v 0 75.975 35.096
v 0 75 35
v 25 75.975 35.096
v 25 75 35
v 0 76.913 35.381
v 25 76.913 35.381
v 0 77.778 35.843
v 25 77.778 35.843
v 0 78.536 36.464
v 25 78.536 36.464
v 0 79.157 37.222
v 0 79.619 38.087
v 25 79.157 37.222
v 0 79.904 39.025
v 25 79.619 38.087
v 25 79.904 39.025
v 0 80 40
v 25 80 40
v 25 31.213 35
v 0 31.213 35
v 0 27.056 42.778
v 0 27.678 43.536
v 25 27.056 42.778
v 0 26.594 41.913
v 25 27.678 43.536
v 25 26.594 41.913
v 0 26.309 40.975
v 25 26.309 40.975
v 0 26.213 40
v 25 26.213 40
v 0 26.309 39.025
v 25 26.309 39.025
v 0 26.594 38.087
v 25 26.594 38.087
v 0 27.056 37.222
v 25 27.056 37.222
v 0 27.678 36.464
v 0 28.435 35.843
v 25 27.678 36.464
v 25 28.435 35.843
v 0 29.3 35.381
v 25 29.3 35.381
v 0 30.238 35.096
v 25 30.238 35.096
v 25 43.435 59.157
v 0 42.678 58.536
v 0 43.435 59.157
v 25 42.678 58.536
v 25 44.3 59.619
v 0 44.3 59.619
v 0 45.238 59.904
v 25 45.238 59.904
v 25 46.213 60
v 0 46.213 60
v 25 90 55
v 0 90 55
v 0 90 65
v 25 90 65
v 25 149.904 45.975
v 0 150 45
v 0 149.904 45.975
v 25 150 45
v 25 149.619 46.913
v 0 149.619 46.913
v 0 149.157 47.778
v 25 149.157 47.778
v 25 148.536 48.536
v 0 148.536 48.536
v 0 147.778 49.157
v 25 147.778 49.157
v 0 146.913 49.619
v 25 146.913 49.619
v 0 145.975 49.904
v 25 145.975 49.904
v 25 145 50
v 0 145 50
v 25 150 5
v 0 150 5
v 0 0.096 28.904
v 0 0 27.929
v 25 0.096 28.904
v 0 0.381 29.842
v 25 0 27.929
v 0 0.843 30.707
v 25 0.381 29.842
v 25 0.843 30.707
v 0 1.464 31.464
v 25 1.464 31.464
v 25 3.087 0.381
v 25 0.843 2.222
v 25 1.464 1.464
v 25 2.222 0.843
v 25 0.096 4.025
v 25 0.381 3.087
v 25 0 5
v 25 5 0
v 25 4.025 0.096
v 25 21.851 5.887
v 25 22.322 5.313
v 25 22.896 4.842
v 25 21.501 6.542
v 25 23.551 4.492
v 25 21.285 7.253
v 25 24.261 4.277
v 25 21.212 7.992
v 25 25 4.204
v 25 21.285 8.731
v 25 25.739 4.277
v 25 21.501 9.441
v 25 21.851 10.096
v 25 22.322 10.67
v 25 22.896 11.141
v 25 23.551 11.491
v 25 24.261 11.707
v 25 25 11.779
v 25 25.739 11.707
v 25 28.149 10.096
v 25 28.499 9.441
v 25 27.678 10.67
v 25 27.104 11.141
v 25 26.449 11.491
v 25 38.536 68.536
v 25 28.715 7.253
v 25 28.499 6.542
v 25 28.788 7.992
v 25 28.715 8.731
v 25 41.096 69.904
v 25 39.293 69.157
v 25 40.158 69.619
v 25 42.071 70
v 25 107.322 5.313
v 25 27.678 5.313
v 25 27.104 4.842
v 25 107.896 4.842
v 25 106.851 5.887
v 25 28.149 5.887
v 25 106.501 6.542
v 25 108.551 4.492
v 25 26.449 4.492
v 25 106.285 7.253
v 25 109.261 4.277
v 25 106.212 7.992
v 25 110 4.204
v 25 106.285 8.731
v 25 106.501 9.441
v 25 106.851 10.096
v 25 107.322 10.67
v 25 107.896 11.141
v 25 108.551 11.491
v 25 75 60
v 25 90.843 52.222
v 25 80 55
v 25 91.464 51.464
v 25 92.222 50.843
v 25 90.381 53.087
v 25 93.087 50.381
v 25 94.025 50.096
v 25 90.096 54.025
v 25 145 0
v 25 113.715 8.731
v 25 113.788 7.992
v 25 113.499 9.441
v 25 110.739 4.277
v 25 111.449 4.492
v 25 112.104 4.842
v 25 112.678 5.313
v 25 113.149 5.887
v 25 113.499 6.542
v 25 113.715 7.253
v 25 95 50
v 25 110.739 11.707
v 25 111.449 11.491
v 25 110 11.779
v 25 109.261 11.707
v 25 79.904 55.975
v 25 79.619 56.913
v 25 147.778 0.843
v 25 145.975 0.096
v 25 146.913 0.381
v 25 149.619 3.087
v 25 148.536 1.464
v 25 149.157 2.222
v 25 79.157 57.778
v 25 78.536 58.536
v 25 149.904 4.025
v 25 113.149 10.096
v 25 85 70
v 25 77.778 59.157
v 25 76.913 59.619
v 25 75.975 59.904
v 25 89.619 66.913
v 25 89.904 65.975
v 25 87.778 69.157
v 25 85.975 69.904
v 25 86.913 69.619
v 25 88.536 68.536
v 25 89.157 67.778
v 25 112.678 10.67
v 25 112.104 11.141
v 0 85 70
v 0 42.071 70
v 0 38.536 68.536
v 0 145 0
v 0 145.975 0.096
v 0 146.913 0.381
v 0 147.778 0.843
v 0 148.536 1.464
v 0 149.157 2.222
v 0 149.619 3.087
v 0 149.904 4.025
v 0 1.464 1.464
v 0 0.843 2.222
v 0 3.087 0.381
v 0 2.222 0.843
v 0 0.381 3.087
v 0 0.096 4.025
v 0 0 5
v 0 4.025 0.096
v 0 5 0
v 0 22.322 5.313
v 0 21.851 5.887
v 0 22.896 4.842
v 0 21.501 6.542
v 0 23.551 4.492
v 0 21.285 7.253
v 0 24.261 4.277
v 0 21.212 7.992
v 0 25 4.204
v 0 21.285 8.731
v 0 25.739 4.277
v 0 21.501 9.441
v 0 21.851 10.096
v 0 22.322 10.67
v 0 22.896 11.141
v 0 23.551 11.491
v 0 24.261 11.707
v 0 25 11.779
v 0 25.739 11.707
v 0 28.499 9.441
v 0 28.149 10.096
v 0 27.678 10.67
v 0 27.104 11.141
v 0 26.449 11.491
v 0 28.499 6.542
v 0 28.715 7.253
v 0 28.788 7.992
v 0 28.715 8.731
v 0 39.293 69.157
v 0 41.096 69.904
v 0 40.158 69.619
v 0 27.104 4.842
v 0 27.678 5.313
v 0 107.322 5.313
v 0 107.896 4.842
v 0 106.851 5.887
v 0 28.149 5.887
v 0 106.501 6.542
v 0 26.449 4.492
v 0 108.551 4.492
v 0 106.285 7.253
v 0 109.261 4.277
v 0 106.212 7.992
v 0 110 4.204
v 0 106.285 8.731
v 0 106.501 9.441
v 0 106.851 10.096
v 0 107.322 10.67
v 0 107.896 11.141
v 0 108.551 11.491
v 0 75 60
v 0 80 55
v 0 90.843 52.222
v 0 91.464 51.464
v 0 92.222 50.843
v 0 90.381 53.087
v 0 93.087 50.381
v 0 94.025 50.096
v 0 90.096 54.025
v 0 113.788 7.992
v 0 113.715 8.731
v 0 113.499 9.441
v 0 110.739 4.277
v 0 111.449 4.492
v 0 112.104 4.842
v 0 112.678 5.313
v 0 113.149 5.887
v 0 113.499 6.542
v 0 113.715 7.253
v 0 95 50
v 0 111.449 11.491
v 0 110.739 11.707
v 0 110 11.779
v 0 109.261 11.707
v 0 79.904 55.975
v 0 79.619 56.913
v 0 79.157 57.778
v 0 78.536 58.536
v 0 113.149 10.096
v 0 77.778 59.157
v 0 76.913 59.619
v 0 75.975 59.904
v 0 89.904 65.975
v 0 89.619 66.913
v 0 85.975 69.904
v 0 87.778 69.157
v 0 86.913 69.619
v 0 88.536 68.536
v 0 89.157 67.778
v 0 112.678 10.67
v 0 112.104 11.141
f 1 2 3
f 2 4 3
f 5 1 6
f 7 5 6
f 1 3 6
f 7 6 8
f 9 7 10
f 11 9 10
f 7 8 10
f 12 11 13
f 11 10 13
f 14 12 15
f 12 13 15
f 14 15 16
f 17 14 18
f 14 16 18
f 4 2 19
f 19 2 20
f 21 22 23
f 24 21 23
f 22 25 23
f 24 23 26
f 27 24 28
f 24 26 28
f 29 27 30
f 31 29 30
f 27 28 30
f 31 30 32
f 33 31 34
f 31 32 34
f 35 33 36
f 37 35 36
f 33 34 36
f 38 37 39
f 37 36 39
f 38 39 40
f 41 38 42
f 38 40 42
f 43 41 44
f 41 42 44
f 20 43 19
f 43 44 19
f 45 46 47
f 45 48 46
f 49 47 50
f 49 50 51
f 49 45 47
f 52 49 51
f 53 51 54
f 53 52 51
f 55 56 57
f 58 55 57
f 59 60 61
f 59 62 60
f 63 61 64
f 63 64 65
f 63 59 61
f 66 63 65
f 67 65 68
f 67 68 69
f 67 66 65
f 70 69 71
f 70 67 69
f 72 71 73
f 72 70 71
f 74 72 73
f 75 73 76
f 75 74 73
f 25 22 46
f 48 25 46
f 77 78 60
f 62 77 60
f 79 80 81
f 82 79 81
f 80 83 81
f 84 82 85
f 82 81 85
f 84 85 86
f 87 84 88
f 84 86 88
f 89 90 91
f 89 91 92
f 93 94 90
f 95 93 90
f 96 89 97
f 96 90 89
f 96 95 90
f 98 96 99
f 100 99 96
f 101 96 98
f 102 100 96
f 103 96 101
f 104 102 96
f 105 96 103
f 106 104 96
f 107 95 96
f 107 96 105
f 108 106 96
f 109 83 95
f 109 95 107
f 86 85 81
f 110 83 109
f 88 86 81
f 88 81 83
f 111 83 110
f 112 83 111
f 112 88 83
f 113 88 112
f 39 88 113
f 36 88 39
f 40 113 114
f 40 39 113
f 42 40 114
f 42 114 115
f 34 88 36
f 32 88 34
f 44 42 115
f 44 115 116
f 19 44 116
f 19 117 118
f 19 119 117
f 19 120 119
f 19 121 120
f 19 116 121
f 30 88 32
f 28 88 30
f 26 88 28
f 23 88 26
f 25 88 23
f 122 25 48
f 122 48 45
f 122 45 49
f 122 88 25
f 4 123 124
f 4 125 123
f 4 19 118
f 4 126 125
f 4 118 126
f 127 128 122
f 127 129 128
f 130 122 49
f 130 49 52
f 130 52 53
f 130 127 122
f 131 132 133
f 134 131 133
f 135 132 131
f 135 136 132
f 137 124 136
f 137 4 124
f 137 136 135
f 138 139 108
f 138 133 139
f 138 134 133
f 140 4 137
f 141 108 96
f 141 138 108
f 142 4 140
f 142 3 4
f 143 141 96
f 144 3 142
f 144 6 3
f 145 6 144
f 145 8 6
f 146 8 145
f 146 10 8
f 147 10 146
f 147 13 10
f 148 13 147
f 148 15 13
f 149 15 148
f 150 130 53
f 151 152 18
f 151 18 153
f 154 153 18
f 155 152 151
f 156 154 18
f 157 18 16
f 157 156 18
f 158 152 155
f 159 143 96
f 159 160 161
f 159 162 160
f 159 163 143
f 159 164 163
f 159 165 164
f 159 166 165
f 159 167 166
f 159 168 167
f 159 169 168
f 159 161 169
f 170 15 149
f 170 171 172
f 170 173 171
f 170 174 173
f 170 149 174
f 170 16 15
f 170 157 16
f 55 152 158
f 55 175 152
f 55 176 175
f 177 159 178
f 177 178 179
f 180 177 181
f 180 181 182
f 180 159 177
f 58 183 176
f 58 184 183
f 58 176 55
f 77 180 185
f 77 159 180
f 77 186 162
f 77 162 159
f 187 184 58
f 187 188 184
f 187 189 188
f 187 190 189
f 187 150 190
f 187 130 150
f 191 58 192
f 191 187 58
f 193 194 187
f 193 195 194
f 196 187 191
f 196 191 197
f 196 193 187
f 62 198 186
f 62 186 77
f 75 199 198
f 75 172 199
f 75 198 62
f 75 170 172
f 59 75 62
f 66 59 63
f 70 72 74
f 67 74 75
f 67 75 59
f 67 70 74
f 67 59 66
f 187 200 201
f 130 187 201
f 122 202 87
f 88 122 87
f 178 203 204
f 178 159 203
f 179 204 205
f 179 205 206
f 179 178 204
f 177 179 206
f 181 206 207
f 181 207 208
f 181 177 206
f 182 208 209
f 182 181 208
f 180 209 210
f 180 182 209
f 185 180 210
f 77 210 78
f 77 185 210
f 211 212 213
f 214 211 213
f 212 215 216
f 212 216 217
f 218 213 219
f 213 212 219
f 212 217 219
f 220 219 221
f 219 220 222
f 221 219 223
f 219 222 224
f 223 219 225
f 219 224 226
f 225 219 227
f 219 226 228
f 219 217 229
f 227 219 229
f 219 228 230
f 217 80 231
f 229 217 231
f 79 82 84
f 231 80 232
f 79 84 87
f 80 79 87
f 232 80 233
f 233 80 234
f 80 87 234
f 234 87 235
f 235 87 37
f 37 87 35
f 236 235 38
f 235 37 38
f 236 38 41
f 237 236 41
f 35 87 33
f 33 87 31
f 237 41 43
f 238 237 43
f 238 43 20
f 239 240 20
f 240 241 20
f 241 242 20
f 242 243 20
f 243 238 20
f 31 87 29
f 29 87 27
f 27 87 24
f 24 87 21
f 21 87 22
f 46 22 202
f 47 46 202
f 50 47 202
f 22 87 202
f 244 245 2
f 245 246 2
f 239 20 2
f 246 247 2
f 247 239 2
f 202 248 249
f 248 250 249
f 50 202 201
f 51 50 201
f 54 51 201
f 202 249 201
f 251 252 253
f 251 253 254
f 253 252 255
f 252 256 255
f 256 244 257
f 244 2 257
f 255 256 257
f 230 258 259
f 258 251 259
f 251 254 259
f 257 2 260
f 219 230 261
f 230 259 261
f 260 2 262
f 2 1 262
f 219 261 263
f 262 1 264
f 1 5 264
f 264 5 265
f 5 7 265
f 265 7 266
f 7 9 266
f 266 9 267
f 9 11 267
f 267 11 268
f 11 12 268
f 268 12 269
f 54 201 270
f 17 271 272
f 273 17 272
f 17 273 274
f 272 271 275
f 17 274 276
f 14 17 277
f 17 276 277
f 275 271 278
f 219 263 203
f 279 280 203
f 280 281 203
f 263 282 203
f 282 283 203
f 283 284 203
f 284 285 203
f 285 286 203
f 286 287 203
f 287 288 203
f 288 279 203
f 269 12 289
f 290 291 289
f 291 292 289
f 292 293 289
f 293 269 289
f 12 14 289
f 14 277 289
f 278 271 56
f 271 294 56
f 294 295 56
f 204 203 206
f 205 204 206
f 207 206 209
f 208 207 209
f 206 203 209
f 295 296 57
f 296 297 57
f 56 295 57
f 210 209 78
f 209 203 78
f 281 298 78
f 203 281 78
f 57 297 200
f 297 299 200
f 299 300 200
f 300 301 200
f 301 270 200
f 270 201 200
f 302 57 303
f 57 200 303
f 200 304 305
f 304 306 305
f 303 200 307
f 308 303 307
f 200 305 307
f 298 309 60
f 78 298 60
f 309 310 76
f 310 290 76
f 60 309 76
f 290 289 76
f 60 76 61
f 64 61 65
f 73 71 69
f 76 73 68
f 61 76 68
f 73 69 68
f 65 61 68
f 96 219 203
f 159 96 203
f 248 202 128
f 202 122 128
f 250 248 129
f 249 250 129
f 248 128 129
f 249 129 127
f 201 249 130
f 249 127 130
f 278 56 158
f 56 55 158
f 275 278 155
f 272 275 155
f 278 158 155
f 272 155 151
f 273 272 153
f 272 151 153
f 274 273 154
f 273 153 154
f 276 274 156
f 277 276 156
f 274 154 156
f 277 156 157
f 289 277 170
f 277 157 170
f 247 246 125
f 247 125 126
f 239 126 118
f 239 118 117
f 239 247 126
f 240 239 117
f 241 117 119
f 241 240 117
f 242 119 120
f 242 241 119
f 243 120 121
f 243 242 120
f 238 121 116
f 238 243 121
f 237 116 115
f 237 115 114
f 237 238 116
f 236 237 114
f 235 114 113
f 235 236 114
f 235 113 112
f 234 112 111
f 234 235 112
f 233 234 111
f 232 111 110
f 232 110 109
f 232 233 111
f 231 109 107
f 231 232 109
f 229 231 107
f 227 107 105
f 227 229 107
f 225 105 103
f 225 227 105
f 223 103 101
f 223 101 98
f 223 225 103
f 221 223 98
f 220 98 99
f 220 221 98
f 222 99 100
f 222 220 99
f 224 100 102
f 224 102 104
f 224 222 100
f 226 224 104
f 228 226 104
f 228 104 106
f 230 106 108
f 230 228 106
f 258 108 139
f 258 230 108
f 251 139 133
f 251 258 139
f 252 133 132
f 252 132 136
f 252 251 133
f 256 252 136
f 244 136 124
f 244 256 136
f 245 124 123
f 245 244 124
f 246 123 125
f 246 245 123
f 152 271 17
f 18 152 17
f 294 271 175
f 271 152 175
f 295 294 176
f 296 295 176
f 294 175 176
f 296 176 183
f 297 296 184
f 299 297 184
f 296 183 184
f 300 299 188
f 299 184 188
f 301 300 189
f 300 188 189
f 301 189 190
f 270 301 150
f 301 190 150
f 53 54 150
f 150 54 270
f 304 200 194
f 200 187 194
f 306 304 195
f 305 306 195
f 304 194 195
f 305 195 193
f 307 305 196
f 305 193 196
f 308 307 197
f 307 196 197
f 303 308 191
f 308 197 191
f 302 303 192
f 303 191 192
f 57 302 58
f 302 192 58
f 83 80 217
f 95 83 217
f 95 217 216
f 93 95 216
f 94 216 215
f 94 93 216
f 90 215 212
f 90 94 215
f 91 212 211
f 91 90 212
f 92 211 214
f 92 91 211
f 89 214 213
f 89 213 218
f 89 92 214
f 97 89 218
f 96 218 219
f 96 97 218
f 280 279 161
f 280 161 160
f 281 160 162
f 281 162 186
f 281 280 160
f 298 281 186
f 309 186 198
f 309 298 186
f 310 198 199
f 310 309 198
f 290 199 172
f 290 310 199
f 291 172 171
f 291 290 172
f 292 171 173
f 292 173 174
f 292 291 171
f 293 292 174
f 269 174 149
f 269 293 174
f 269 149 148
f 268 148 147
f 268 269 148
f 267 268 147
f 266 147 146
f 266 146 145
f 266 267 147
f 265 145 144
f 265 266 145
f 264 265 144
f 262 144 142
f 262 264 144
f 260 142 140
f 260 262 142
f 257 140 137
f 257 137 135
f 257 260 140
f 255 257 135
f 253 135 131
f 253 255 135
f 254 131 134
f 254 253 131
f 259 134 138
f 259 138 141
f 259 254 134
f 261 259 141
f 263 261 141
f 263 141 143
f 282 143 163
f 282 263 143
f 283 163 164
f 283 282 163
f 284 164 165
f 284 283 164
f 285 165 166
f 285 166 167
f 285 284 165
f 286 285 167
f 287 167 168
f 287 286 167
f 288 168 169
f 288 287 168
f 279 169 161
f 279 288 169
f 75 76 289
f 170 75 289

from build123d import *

# Parameters (mm, degrees)
F0_R     = 3.787682
F1_DEPTH = 25
F2_R     = 5
F3_R     = 5


with BuildPart() as f1:
    # F0 (on Right) → F1 (new body)
    with BuildSketch(Plane.YZ):
        Polygon((0, 30), (0, 0), (150, 0), (150, 50), (90, 50), (90, 70), (40, 70), align=None)
        with Locations((25, 7.99161)):
            Circle(F0_R, mode=Mode.SUBTRACT)
        with Locations((110, 7.99161)):
            Circle(F0_R, mode=Mode.SUBTRACT)
        Polygon((44.142136, 60), (80, 60), (80, 35), (19.142136, 35), align=None, mode=Mode.SUBTRACT)
    extrude(amount=F1_DEPTH)

    # F2
    f2_edges = [f1.edges().sort_by_distance(p)[0] for p in [
        (12.5, 90, 70),
        (12.5, 90, 50),
        (12.5, 150, 50),
        (12.5, 150, 0),
        (12.5, 40, 70),
        (12.5, 0, 30),
        (12.5, 0, 0),
    ]]
    fillet(f2_edges, radius=F2_R)

    # F3
    f3_edges = [f1.edges().sort_by_distance(p)[0] for p in [
        (12.5, 19.142136, 35),
        (12.5, 80, 60),
        (12.5, 44.142136, 60),
        (12.5, 80, 35),
    ]]
    fillet(f3_edges, radius=F3_R)


solid = f1.part
